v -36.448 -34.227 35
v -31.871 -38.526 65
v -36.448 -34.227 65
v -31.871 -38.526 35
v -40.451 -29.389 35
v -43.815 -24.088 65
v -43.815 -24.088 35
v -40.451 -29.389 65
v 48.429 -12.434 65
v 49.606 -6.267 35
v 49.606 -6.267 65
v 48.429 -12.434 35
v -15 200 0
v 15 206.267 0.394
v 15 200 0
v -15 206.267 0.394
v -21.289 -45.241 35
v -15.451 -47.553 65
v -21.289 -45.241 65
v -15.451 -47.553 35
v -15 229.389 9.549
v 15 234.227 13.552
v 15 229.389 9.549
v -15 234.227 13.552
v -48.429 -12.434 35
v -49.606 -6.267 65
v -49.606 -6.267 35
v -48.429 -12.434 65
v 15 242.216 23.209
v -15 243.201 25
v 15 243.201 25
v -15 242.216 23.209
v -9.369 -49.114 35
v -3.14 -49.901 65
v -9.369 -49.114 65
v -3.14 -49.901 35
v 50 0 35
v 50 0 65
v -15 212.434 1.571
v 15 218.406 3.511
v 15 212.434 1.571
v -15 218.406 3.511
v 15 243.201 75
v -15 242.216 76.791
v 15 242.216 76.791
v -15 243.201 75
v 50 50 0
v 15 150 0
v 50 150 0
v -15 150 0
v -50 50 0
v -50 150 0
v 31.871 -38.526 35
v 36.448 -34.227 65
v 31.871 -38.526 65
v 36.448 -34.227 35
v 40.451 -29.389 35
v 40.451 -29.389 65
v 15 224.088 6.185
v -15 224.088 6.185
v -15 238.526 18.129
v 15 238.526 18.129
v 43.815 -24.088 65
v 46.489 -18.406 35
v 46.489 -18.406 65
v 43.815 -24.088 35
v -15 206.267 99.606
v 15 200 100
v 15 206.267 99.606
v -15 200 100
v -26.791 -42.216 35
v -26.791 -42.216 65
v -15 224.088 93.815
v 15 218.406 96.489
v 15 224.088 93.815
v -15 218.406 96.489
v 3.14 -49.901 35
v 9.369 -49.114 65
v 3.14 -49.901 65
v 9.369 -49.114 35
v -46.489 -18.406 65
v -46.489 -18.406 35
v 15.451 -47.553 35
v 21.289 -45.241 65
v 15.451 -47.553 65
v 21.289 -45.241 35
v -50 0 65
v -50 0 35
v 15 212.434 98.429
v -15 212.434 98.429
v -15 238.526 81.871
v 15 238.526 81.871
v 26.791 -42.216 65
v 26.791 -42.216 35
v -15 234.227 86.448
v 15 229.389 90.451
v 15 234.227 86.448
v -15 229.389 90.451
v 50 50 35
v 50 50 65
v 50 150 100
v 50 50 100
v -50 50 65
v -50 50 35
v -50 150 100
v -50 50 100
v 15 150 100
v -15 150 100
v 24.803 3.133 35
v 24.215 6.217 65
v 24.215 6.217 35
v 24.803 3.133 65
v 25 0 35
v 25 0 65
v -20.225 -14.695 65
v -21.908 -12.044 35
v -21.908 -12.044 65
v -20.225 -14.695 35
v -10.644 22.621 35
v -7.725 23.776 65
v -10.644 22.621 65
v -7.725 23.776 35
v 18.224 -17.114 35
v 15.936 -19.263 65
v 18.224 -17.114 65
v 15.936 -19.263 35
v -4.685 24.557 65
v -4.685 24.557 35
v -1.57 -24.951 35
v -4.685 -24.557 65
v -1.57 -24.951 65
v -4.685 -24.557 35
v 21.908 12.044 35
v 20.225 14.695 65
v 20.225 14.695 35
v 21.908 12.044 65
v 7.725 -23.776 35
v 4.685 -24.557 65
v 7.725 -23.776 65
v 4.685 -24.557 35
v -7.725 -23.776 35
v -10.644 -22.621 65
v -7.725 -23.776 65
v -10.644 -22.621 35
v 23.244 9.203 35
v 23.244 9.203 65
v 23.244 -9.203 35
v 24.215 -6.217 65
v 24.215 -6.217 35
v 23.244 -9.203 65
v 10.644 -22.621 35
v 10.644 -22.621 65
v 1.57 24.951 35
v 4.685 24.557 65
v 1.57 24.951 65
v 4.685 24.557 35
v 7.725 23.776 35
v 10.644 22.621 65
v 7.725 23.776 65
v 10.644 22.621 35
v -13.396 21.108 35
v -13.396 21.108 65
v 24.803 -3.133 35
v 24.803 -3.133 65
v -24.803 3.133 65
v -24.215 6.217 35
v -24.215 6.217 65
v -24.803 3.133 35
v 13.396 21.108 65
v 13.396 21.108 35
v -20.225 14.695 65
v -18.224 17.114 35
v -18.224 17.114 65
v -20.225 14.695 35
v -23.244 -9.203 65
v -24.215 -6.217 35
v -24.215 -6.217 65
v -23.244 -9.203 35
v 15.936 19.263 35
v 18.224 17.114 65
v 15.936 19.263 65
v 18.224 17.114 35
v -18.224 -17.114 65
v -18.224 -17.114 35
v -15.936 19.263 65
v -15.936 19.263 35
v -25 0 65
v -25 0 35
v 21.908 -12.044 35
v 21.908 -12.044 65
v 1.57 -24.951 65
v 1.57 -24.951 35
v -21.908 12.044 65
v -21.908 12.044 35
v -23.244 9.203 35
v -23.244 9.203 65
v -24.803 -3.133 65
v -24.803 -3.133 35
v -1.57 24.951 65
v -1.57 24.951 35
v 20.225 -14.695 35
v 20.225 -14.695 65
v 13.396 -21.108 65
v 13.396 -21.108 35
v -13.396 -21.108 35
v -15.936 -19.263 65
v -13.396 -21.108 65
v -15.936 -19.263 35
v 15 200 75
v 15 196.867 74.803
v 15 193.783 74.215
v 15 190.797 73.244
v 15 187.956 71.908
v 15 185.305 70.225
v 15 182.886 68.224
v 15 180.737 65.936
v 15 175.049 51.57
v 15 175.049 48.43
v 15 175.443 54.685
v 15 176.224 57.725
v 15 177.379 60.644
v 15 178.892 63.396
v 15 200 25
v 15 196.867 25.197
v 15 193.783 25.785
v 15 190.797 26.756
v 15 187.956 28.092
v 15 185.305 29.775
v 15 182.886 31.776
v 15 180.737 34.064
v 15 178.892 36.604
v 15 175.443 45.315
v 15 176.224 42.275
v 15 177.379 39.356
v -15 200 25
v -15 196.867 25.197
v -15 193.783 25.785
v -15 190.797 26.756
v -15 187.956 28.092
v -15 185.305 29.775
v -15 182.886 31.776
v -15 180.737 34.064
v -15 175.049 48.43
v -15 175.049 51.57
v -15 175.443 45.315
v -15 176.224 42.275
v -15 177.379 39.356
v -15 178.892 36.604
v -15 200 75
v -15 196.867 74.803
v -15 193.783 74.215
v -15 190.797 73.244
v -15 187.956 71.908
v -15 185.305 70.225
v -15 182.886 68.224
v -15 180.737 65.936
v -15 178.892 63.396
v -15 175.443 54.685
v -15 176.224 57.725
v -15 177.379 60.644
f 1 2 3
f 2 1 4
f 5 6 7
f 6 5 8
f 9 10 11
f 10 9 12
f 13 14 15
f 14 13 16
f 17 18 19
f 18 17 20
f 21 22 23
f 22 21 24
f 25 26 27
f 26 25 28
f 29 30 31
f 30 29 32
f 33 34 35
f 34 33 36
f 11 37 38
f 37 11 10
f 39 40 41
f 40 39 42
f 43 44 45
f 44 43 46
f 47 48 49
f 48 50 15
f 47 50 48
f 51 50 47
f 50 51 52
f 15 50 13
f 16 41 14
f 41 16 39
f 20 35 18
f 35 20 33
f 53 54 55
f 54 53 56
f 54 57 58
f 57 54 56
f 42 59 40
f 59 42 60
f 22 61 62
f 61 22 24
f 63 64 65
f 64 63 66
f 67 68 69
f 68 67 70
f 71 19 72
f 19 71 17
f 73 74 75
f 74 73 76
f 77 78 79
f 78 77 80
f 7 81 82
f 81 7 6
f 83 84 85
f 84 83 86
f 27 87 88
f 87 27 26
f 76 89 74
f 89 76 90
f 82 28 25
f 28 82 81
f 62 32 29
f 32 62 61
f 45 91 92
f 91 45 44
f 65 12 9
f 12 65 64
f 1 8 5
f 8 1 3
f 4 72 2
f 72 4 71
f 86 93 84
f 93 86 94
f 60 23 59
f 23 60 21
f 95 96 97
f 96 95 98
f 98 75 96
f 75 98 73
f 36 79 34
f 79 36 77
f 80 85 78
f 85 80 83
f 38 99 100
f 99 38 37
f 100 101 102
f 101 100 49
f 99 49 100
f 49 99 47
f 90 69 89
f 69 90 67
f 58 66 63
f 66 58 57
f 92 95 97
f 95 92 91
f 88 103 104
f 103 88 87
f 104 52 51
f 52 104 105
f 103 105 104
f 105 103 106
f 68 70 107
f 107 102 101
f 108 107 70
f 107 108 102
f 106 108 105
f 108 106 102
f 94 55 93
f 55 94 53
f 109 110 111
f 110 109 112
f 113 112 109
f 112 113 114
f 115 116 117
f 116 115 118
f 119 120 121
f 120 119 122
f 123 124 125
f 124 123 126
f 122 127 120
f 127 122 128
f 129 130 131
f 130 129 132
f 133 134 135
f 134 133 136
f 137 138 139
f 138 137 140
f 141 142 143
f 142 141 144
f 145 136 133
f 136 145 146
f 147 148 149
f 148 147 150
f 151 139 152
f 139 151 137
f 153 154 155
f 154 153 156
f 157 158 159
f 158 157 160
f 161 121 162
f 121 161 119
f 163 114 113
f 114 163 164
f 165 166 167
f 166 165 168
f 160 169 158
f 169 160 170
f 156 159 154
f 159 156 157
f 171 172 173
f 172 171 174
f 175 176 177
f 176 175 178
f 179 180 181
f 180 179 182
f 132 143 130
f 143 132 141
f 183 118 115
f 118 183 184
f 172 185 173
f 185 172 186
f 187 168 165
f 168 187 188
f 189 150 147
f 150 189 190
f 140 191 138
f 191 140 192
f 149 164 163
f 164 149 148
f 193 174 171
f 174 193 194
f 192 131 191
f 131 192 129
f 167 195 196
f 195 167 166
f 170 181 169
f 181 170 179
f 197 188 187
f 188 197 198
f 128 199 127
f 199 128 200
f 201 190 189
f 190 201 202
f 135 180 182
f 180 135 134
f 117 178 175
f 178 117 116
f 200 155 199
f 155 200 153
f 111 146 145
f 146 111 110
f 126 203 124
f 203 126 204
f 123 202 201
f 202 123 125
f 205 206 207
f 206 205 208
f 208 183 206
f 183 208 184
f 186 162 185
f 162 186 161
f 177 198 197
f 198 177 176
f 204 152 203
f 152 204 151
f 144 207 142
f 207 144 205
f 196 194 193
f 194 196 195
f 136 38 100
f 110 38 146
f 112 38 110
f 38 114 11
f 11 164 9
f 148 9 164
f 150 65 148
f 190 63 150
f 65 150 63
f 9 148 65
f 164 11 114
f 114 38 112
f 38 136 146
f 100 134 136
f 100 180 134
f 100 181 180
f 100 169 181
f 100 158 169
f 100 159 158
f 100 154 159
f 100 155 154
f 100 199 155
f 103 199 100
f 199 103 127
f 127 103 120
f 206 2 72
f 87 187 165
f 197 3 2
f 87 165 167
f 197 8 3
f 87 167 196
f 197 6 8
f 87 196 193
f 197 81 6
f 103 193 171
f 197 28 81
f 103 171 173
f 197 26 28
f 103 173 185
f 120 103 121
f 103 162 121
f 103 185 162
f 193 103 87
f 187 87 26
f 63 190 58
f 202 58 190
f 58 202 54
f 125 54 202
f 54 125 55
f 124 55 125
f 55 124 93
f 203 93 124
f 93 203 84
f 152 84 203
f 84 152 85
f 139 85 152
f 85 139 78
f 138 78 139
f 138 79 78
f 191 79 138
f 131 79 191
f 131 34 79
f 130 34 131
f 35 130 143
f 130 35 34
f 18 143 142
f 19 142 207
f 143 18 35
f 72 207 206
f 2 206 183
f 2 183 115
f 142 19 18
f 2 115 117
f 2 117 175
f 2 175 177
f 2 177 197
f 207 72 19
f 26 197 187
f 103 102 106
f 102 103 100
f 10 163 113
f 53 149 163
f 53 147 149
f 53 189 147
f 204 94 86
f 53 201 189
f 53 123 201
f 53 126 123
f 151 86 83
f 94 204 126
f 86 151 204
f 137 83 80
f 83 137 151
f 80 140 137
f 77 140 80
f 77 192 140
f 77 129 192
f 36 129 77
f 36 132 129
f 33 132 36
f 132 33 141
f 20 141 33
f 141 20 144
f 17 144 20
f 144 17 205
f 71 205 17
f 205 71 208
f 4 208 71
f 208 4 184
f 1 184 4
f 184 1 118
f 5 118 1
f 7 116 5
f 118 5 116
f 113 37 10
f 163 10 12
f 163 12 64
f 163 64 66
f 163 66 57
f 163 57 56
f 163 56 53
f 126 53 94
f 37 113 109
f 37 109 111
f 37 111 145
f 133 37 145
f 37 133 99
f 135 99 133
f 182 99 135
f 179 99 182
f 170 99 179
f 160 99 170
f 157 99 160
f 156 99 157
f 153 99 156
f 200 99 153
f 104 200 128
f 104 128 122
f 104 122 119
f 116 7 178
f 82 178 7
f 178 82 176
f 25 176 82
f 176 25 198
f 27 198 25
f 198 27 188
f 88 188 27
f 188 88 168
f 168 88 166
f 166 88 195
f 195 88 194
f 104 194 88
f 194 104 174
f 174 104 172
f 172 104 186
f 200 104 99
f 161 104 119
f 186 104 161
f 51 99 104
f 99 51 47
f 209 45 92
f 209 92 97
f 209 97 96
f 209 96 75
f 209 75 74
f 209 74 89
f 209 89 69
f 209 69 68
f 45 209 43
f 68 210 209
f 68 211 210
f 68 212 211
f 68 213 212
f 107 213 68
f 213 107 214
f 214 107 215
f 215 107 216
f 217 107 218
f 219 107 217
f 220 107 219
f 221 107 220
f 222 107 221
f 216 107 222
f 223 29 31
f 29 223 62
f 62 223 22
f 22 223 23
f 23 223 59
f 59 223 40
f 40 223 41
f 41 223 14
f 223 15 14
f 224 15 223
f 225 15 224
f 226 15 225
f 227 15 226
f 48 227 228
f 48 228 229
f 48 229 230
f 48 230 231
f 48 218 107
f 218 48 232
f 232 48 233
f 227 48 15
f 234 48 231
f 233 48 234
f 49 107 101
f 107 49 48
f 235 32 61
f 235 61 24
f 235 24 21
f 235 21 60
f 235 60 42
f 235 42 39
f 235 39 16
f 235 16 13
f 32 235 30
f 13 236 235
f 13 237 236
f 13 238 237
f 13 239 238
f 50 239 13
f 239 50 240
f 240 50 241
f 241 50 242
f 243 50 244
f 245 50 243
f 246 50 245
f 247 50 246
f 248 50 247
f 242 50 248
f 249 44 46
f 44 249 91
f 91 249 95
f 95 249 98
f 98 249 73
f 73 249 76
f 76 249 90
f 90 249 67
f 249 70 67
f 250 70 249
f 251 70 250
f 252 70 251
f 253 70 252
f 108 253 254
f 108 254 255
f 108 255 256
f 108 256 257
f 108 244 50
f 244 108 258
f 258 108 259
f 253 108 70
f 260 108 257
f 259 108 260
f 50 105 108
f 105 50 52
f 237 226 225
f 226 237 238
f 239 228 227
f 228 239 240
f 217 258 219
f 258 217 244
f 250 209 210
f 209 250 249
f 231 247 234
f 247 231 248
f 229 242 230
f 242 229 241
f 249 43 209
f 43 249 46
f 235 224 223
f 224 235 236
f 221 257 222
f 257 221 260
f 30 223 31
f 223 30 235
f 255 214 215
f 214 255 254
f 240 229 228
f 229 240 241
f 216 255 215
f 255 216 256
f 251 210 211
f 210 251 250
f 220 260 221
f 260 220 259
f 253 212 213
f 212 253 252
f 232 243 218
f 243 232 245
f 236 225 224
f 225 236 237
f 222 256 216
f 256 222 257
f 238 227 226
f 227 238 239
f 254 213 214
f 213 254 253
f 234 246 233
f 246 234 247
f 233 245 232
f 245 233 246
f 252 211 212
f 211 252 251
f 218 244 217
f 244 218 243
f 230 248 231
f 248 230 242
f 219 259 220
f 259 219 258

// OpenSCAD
$fn = 50;
//variables
outerCircleRadius = 50;
cutCircleDiameter = 50;
circularMountThickness = 100;
interCenterLength = 200;
squaredRadius = 100;
squareDepth = 35;

difference(){
    hull(){
        cylinder(circularMountThickness,r = outerCircleRadius);
        
        translate([ - circularMountThickness / 2, interCenterLength, circularMountThickness / 2 ])
        rotate([0,90,0])
        cylinder(circularMountThickness,r = outerCircleRadius);
    }
    
    
        cylinder(circularMountThickness,d = outerCircleRadius);

        translate([ 0, 0, circularMountThickness - (squareDepth / 2)])
        cube([squaredRadius, squaredRadius, squareDepth], true);
        
        translate([ 0, 0, (squareDepth / 2)])
        cube([squaredRadius, squaredRadius, squareDepth], true);
        
        mirror([0, 0, 0])
        translate([ (circularMountThickness / 2) - squareDepth, interCenterLength - outerCircleRadius, 0])
        cube([squareDepth, squaredRadius, squaredRadius]);
        
        mirror([1, 0, 0])
        translate([ (circularMountThickness / 2) - squareDepth, interCenterLength - outerCircleRadius, 0])
        cube([squareDepth, squaredRadius, squaredRadius]);
    
    
    hull(){
        translate([ - circularMountThickness / 2, interCenterLength, circularMountThickness / 2 ])
        rotate([0,90,0])
        cylinder(circularMountThickness,d = cutCircleDiameter);
        
        translate([ - circularMountThickness / 2, interCenterLength + cutCircleDiameter, circularMountThickness / 2 ])
        rotate([0,90,0])
        cylinder(circularMountThickness,d = cutCircleDiameter);
      }
}
